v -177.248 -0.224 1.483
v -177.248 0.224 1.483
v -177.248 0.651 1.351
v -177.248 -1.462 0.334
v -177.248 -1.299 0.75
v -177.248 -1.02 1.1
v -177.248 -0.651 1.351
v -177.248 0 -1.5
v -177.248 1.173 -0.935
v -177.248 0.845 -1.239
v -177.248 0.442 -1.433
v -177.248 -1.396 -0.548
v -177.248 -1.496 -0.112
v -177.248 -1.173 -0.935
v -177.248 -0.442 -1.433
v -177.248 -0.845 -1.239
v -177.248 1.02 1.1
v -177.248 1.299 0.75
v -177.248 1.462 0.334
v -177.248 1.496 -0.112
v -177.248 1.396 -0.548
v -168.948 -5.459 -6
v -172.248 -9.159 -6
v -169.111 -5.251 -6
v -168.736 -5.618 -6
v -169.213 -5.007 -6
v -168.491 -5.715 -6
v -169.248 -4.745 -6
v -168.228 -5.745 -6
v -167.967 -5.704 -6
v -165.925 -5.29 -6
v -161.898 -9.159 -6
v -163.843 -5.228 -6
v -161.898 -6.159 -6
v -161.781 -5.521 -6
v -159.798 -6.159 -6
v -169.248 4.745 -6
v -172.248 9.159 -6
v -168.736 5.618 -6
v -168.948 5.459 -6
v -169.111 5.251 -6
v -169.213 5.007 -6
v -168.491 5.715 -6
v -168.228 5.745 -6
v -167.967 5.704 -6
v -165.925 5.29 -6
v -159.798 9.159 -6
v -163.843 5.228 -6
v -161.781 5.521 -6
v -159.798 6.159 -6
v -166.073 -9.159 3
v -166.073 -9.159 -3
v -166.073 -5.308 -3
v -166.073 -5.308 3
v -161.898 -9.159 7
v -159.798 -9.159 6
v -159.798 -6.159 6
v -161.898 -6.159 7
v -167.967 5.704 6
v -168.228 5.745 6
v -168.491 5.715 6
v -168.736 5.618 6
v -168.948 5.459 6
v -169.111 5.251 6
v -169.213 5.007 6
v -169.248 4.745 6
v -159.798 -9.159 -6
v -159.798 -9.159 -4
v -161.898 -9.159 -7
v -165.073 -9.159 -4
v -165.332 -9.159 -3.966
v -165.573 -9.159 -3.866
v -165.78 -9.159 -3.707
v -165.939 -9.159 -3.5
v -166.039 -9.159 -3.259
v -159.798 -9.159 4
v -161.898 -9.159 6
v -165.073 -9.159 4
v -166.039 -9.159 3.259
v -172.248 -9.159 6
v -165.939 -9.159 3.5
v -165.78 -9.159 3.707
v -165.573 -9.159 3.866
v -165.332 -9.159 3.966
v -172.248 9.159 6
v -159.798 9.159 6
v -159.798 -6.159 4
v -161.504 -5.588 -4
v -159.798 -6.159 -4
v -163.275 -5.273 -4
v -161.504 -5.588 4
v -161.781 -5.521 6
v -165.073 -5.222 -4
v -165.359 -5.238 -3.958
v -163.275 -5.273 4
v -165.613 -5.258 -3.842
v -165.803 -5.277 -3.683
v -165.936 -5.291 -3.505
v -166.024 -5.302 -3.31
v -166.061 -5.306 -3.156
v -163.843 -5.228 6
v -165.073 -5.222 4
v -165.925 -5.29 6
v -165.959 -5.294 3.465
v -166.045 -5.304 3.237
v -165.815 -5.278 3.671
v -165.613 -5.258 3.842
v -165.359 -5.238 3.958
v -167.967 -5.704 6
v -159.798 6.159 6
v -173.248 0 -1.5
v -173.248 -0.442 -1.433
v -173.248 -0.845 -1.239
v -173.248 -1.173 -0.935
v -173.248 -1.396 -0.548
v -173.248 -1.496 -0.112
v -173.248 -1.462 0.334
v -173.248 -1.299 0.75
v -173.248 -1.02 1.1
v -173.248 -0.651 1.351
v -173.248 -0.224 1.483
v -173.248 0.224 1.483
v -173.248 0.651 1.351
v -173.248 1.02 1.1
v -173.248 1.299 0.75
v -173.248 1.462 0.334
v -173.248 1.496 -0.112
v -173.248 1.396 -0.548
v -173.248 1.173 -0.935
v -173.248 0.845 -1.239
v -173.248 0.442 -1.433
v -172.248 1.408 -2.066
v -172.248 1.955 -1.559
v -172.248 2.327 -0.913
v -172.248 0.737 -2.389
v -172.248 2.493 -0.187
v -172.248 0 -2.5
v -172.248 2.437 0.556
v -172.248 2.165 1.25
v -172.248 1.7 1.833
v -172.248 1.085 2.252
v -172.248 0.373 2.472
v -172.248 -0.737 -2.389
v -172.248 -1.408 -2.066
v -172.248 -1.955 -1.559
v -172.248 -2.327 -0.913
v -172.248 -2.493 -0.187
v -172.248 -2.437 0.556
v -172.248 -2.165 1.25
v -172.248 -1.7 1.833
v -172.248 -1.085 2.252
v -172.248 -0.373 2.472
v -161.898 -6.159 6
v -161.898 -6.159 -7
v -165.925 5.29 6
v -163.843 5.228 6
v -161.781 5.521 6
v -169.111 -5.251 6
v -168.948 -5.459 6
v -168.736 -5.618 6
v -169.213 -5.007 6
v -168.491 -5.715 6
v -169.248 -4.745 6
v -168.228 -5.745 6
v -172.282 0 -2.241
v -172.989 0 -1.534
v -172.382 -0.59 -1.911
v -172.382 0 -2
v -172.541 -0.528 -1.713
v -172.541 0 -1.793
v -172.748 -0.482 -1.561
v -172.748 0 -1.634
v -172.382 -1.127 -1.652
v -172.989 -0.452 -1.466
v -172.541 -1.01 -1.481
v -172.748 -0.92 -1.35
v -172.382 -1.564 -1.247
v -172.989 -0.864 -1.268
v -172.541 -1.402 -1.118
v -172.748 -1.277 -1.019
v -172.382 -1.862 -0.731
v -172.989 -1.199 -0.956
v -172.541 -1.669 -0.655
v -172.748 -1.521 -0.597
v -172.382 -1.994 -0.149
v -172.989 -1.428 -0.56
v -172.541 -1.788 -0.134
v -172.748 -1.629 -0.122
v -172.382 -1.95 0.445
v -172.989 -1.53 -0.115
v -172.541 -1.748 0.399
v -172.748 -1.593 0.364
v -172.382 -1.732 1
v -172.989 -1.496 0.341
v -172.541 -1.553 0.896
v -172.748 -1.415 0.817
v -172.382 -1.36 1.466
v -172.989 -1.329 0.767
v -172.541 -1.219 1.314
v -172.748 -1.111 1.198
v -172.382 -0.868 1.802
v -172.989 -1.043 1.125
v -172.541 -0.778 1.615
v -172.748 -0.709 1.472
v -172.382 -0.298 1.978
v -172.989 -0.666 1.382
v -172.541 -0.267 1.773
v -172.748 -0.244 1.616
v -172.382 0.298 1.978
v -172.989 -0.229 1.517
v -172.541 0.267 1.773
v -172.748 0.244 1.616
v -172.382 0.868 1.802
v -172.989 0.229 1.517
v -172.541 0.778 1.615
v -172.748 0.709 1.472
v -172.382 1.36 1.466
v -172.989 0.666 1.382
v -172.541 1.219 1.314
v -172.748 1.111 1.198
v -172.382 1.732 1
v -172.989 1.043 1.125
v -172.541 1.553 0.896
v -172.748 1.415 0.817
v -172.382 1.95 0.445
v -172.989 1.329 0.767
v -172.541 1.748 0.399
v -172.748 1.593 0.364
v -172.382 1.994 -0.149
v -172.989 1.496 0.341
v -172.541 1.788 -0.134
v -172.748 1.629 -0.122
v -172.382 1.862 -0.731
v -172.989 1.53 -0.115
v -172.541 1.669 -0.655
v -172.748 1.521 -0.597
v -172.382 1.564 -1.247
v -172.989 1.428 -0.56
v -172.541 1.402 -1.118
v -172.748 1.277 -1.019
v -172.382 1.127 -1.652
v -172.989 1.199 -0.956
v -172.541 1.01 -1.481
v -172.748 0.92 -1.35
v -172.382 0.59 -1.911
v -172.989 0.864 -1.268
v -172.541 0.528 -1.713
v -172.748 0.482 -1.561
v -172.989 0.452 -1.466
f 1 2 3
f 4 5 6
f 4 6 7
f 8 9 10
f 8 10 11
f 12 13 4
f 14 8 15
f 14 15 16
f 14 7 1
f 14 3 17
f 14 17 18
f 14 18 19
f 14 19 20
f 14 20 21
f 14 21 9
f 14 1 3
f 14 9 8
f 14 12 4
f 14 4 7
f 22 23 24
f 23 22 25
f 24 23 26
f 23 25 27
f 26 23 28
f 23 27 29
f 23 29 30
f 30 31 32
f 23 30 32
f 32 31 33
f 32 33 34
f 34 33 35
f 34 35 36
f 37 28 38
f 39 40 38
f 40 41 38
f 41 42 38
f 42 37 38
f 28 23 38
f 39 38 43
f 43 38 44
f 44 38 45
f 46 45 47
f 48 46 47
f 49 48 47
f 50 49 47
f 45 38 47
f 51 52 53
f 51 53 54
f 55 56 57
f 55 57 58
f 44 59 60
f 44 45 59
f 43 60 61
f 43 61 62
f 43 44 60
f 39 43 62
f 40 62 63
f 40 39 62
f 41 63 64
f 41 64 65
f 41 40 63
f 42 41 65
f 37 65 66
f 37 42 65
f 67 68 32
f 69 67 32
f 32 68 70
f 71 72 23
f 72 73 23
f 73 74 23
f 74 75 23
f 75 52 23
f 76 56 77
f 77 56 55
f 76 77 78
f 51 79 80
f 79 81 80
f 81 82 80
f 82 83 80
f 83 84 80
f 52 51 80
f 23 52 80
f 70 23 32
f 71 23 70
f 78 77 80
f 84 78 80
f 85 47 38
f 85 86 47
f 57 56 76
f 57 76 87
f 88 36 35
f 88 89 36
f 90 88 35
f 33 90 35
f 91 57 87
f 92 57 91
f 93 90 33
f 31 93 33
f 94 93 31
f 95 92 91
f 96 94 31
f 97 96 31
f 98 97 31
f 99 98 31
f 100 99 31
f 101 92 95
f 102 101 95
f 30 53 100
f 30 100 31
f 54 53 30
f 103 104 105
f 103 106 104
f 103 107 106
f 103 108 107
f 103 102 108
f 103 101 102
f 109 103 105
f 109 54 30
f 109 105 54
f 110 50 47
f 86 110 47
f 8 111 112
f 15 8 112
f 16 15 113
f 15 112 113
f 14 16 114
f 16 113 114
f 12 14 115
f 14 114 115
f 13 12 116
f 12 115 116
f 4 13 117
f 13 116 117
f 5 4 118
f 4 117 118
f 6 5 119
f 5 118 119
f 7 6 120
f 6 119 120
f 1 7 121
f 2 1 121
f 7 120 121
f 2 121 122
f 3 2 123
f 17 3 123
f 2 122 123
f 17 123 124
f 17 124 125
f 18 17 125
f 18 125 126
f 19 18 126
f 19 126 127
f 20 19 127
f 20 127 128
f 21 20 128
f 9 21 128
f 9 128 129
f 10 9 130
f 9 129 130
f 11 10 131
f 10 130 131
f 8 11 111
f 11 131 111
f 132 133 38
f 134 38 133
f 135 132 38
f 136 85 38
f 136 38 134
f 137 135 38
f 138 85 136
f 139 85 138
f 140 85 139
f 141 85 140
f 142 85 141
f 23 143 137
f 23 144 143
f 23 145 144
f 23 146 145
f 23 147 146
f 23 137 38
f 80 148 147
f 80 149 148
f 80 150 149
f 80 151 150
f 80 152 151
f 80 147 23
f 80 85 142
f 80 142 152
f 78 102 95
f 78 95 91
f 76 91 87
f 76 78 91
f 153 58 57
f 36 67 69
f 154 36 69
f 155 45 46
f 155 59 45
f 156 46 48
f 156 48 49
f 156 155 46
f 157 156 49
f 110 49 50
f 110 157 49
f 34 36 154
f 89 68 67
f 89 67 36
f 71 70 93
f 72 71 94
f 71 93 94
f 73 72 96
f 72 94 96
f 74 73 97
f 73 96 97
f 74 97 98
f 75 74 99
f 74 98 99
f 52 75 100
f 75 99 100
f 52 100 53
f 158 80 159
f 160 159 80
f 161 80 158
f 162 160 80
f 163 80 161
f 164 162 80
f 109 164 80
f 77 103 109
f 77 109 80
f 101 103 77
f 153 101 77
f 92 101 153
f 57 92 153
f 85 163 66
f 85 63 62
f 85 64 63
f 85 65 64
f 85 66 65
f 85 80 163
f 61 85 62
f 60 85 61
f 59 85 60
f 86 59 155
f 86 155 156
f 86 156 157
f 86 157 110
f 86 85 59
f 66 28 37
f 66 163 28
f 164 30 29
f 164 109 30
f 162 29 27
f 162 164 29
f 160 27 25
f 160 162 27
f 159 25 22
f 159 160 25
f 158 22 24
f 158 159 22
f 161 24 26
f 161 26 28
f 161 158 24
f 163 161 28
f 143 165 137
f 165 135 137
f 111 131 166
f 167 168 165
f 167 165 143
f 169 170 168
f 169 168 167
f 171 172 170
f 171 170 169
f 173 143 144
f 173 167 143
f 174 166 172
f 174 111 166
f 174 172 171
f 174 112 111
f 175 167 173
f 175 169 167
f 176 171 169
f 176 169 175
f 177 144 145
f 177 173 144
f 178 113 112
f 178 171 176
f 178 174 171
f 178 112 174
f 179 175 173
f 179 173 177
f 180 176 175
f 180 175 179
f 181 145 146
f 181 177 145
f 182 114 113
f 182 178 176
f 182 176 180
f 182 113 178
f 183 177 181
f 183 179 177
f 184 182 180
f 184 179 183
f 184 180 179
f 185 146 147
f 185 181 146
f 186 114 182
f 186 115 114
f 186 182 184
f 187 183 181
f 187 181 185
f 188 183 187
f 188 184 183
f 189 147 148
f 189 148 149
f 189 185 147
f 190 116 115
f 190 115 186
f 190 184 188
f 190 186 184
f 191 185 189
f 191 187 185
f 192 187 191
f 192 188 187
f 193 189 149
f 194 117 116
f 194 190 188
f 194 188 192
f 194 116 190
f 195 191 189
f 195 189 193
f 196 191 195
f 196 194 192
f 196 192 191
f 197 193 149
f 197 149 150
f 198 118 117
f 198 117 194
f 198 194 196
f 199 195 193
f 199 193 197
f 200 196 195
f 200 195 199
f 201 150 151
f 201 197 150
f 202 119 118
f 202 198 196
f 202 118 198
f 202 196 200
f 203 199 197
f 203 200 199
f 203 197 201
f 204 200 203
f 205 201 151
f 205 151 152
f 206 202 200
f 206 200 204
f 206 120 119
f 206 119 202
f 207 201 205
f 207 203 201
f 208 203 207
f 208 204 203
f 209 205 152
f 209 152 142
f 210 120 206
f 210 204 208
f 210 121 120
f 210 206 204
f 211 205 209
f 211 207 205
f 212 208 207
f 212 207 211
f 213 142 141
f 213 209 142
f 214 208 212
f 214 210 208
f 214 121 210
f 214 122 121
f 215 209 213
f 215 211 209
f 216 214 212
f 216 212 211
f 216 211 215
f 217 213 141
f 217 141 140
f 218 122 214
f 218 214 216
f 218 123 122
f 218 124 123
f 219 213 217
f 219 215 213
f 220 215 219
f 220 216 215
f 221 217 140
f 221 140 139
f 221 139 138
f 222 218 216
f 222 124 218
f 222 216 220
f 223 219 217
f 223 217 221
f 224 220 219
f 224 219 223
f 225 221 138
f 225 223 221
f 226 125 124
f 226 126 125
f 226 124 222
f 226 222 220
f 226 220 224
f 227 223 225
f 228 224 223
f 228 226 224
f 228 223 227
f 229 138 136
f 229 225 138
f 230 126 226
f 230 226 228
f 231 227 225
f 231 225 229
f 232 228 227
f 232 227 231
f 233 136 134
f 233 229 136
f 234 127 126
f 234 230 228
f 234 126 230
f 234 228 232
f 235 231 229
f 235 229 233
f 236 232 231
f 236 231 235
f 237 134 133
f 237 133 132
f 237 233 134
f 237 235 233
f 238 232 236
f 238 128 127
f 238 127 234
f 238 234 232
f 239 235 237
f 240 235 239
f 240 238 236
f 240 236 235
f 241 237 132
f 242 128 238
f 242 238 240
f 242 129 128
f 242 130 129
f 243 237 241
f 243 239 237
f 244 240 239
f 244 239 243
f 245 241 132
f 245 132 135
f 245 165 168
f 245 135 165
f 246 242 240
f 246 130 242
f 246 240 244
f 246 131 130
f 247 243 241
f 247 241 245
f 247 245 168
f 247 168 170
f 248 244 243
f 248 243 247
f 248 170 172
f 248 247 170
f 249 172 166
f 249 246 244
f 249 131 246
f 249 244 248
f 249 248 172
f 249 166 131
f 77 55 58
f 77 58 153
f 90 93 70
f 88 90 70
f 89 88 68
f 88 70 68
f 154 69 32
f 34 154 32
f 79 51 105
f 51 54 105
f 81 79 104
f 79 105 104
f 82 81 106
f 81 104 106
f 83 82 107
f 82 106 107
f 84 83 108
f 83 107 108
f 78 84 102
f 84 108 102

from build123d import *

# Parameters (mm, degrees)
MAINBODY_DEPTH      = 6
HOOK_DEPTH          = 3.000005
FLEX_REACH          = 175.361
FLEX_END_RADIUS     = 12.225328947
SKETCH4_W           = 6.275
SKETCH4_H           = 8
FILLET1_R           = 1
FILLET2_R           = 1
SKETCH7_R           = 1.5
BOSS_EXTRUDE2_DEPTH = 5
FILLET3_R           = 1


with BuildPart() as part:
    # Sketch1 → MainBody (new, symmetric)
    with BuildSketch(Plane.XY):
        with BuildLine():
            Line((-159.798174106, 9.159375), (-172.248174106, 9.159375))
            Line((-172.248174106, 9.159375), (-172.248174106, -9.159375))
            Line((-172.248174106, -9.159375), (-159.798174106, -9.159375))
            Line((-159.798174106, -9.159375), (-159.798174106, -6.159375))
            ThreePointArc((-159.798174106, -6.159375), (-164.523174106, -5.209375), (-169.248174106, -6.159375))
            Line((-169.248174106, -6.159375), (-169.248174106, -5.159375))
            Line((-169.248174106, -5.159375), (-169.248174106, 5.159375))
            Line((-169.248174106, 5.159375), (-169.248174106, 6.159375))
            ThreePointArc((-169.248174106, 6.159375), (-164.523174106, 5.209375), (-159.798174106, 6.159375))
            Line((-159.798174106, 6.159375), (-159.798174106, 9.159375))
        make_face()
    extrude(amount=MAINBODY_DEPTH, both=True)

    # Sketch3 → Hook (add)
    with BuildSketch(Plane.XZ.offset(9.159375)):
        Polygon((-159.798174106, -6), (-161.898174106, -7), (-161.898174106, -6), align=None)
        Polygon((-161.898174106, 6), (-159.798174106, 6), (-161.898174106, 7), align=None)
    extrude(amount=-HOOK_DEPTH)

    # Flex: up to this cylinder (the profile starts inside it)
    flex_end = Plane(origin=(-164.523174106, -17.434703947, 0), z_dir=(0, 0, -1)) * Cylinder(FLEX_END_RADIUS, 376.172657895, mode=Mode.PRIVATE)
    # Sketch4 → Flex (cut, up to the surface)
    with BuildSketch(Plane.XZ.offset(9.159375), mode=Mode.PRIVATE) as flex_sk1:
        with Locations((-162.935674106, 0)):
            Rectangle(SKETCH4_W, SKETCH4_H)
    flex_tool1 = extrude(flex_sk1.sketch, amount=-FLEX_REACH, mode=Mode.PRIVATE) & flex_end
    add(flex_tool1.solids().sort_by_distance((-162.935674, -9.159375, 0))[0], mode=Mode.SUBTRACT)

    # Fillet1
    fillet1_edges = [part.edges().sort_by_distance(p)[0] for p in [
        (-166.073174106, -7.233703596, 4),
        (-166.073174106, -7.233703596, -4),
    ]]
    fillet(fillet1_edges, radius=FILLET1_R)

    # Fillet2
    fillet2_edges = [part.edges().sort_by_distance(p)[0] for p in [
        (-169.248174106, 6.159375, 0),
        (-169.248174106, -6.159375, 0),
    ]]
    fillet(fillet2_edges, radius=FILLET2_R)

    # Sketch7 → Boss-Extrude2 (add)
    with BuildSketch(Plane.ZY.offset(172.248174106)):
        with Locations(Location((0, 0, 0), (0, 0, 180))):
            Circle(SKETCH7_R)
    extrude(amount=BOSS_EXTRUDE2_DEPTH)

    # Fillet3
    fillet3_edges = [part.edges().sort_by_distance(p)[0] for p in [
        (-172.248174106, 0, 1.5),
    ]]
    fillet(fillet3_edges, radius=FILLET3_R)


solid = part.part
